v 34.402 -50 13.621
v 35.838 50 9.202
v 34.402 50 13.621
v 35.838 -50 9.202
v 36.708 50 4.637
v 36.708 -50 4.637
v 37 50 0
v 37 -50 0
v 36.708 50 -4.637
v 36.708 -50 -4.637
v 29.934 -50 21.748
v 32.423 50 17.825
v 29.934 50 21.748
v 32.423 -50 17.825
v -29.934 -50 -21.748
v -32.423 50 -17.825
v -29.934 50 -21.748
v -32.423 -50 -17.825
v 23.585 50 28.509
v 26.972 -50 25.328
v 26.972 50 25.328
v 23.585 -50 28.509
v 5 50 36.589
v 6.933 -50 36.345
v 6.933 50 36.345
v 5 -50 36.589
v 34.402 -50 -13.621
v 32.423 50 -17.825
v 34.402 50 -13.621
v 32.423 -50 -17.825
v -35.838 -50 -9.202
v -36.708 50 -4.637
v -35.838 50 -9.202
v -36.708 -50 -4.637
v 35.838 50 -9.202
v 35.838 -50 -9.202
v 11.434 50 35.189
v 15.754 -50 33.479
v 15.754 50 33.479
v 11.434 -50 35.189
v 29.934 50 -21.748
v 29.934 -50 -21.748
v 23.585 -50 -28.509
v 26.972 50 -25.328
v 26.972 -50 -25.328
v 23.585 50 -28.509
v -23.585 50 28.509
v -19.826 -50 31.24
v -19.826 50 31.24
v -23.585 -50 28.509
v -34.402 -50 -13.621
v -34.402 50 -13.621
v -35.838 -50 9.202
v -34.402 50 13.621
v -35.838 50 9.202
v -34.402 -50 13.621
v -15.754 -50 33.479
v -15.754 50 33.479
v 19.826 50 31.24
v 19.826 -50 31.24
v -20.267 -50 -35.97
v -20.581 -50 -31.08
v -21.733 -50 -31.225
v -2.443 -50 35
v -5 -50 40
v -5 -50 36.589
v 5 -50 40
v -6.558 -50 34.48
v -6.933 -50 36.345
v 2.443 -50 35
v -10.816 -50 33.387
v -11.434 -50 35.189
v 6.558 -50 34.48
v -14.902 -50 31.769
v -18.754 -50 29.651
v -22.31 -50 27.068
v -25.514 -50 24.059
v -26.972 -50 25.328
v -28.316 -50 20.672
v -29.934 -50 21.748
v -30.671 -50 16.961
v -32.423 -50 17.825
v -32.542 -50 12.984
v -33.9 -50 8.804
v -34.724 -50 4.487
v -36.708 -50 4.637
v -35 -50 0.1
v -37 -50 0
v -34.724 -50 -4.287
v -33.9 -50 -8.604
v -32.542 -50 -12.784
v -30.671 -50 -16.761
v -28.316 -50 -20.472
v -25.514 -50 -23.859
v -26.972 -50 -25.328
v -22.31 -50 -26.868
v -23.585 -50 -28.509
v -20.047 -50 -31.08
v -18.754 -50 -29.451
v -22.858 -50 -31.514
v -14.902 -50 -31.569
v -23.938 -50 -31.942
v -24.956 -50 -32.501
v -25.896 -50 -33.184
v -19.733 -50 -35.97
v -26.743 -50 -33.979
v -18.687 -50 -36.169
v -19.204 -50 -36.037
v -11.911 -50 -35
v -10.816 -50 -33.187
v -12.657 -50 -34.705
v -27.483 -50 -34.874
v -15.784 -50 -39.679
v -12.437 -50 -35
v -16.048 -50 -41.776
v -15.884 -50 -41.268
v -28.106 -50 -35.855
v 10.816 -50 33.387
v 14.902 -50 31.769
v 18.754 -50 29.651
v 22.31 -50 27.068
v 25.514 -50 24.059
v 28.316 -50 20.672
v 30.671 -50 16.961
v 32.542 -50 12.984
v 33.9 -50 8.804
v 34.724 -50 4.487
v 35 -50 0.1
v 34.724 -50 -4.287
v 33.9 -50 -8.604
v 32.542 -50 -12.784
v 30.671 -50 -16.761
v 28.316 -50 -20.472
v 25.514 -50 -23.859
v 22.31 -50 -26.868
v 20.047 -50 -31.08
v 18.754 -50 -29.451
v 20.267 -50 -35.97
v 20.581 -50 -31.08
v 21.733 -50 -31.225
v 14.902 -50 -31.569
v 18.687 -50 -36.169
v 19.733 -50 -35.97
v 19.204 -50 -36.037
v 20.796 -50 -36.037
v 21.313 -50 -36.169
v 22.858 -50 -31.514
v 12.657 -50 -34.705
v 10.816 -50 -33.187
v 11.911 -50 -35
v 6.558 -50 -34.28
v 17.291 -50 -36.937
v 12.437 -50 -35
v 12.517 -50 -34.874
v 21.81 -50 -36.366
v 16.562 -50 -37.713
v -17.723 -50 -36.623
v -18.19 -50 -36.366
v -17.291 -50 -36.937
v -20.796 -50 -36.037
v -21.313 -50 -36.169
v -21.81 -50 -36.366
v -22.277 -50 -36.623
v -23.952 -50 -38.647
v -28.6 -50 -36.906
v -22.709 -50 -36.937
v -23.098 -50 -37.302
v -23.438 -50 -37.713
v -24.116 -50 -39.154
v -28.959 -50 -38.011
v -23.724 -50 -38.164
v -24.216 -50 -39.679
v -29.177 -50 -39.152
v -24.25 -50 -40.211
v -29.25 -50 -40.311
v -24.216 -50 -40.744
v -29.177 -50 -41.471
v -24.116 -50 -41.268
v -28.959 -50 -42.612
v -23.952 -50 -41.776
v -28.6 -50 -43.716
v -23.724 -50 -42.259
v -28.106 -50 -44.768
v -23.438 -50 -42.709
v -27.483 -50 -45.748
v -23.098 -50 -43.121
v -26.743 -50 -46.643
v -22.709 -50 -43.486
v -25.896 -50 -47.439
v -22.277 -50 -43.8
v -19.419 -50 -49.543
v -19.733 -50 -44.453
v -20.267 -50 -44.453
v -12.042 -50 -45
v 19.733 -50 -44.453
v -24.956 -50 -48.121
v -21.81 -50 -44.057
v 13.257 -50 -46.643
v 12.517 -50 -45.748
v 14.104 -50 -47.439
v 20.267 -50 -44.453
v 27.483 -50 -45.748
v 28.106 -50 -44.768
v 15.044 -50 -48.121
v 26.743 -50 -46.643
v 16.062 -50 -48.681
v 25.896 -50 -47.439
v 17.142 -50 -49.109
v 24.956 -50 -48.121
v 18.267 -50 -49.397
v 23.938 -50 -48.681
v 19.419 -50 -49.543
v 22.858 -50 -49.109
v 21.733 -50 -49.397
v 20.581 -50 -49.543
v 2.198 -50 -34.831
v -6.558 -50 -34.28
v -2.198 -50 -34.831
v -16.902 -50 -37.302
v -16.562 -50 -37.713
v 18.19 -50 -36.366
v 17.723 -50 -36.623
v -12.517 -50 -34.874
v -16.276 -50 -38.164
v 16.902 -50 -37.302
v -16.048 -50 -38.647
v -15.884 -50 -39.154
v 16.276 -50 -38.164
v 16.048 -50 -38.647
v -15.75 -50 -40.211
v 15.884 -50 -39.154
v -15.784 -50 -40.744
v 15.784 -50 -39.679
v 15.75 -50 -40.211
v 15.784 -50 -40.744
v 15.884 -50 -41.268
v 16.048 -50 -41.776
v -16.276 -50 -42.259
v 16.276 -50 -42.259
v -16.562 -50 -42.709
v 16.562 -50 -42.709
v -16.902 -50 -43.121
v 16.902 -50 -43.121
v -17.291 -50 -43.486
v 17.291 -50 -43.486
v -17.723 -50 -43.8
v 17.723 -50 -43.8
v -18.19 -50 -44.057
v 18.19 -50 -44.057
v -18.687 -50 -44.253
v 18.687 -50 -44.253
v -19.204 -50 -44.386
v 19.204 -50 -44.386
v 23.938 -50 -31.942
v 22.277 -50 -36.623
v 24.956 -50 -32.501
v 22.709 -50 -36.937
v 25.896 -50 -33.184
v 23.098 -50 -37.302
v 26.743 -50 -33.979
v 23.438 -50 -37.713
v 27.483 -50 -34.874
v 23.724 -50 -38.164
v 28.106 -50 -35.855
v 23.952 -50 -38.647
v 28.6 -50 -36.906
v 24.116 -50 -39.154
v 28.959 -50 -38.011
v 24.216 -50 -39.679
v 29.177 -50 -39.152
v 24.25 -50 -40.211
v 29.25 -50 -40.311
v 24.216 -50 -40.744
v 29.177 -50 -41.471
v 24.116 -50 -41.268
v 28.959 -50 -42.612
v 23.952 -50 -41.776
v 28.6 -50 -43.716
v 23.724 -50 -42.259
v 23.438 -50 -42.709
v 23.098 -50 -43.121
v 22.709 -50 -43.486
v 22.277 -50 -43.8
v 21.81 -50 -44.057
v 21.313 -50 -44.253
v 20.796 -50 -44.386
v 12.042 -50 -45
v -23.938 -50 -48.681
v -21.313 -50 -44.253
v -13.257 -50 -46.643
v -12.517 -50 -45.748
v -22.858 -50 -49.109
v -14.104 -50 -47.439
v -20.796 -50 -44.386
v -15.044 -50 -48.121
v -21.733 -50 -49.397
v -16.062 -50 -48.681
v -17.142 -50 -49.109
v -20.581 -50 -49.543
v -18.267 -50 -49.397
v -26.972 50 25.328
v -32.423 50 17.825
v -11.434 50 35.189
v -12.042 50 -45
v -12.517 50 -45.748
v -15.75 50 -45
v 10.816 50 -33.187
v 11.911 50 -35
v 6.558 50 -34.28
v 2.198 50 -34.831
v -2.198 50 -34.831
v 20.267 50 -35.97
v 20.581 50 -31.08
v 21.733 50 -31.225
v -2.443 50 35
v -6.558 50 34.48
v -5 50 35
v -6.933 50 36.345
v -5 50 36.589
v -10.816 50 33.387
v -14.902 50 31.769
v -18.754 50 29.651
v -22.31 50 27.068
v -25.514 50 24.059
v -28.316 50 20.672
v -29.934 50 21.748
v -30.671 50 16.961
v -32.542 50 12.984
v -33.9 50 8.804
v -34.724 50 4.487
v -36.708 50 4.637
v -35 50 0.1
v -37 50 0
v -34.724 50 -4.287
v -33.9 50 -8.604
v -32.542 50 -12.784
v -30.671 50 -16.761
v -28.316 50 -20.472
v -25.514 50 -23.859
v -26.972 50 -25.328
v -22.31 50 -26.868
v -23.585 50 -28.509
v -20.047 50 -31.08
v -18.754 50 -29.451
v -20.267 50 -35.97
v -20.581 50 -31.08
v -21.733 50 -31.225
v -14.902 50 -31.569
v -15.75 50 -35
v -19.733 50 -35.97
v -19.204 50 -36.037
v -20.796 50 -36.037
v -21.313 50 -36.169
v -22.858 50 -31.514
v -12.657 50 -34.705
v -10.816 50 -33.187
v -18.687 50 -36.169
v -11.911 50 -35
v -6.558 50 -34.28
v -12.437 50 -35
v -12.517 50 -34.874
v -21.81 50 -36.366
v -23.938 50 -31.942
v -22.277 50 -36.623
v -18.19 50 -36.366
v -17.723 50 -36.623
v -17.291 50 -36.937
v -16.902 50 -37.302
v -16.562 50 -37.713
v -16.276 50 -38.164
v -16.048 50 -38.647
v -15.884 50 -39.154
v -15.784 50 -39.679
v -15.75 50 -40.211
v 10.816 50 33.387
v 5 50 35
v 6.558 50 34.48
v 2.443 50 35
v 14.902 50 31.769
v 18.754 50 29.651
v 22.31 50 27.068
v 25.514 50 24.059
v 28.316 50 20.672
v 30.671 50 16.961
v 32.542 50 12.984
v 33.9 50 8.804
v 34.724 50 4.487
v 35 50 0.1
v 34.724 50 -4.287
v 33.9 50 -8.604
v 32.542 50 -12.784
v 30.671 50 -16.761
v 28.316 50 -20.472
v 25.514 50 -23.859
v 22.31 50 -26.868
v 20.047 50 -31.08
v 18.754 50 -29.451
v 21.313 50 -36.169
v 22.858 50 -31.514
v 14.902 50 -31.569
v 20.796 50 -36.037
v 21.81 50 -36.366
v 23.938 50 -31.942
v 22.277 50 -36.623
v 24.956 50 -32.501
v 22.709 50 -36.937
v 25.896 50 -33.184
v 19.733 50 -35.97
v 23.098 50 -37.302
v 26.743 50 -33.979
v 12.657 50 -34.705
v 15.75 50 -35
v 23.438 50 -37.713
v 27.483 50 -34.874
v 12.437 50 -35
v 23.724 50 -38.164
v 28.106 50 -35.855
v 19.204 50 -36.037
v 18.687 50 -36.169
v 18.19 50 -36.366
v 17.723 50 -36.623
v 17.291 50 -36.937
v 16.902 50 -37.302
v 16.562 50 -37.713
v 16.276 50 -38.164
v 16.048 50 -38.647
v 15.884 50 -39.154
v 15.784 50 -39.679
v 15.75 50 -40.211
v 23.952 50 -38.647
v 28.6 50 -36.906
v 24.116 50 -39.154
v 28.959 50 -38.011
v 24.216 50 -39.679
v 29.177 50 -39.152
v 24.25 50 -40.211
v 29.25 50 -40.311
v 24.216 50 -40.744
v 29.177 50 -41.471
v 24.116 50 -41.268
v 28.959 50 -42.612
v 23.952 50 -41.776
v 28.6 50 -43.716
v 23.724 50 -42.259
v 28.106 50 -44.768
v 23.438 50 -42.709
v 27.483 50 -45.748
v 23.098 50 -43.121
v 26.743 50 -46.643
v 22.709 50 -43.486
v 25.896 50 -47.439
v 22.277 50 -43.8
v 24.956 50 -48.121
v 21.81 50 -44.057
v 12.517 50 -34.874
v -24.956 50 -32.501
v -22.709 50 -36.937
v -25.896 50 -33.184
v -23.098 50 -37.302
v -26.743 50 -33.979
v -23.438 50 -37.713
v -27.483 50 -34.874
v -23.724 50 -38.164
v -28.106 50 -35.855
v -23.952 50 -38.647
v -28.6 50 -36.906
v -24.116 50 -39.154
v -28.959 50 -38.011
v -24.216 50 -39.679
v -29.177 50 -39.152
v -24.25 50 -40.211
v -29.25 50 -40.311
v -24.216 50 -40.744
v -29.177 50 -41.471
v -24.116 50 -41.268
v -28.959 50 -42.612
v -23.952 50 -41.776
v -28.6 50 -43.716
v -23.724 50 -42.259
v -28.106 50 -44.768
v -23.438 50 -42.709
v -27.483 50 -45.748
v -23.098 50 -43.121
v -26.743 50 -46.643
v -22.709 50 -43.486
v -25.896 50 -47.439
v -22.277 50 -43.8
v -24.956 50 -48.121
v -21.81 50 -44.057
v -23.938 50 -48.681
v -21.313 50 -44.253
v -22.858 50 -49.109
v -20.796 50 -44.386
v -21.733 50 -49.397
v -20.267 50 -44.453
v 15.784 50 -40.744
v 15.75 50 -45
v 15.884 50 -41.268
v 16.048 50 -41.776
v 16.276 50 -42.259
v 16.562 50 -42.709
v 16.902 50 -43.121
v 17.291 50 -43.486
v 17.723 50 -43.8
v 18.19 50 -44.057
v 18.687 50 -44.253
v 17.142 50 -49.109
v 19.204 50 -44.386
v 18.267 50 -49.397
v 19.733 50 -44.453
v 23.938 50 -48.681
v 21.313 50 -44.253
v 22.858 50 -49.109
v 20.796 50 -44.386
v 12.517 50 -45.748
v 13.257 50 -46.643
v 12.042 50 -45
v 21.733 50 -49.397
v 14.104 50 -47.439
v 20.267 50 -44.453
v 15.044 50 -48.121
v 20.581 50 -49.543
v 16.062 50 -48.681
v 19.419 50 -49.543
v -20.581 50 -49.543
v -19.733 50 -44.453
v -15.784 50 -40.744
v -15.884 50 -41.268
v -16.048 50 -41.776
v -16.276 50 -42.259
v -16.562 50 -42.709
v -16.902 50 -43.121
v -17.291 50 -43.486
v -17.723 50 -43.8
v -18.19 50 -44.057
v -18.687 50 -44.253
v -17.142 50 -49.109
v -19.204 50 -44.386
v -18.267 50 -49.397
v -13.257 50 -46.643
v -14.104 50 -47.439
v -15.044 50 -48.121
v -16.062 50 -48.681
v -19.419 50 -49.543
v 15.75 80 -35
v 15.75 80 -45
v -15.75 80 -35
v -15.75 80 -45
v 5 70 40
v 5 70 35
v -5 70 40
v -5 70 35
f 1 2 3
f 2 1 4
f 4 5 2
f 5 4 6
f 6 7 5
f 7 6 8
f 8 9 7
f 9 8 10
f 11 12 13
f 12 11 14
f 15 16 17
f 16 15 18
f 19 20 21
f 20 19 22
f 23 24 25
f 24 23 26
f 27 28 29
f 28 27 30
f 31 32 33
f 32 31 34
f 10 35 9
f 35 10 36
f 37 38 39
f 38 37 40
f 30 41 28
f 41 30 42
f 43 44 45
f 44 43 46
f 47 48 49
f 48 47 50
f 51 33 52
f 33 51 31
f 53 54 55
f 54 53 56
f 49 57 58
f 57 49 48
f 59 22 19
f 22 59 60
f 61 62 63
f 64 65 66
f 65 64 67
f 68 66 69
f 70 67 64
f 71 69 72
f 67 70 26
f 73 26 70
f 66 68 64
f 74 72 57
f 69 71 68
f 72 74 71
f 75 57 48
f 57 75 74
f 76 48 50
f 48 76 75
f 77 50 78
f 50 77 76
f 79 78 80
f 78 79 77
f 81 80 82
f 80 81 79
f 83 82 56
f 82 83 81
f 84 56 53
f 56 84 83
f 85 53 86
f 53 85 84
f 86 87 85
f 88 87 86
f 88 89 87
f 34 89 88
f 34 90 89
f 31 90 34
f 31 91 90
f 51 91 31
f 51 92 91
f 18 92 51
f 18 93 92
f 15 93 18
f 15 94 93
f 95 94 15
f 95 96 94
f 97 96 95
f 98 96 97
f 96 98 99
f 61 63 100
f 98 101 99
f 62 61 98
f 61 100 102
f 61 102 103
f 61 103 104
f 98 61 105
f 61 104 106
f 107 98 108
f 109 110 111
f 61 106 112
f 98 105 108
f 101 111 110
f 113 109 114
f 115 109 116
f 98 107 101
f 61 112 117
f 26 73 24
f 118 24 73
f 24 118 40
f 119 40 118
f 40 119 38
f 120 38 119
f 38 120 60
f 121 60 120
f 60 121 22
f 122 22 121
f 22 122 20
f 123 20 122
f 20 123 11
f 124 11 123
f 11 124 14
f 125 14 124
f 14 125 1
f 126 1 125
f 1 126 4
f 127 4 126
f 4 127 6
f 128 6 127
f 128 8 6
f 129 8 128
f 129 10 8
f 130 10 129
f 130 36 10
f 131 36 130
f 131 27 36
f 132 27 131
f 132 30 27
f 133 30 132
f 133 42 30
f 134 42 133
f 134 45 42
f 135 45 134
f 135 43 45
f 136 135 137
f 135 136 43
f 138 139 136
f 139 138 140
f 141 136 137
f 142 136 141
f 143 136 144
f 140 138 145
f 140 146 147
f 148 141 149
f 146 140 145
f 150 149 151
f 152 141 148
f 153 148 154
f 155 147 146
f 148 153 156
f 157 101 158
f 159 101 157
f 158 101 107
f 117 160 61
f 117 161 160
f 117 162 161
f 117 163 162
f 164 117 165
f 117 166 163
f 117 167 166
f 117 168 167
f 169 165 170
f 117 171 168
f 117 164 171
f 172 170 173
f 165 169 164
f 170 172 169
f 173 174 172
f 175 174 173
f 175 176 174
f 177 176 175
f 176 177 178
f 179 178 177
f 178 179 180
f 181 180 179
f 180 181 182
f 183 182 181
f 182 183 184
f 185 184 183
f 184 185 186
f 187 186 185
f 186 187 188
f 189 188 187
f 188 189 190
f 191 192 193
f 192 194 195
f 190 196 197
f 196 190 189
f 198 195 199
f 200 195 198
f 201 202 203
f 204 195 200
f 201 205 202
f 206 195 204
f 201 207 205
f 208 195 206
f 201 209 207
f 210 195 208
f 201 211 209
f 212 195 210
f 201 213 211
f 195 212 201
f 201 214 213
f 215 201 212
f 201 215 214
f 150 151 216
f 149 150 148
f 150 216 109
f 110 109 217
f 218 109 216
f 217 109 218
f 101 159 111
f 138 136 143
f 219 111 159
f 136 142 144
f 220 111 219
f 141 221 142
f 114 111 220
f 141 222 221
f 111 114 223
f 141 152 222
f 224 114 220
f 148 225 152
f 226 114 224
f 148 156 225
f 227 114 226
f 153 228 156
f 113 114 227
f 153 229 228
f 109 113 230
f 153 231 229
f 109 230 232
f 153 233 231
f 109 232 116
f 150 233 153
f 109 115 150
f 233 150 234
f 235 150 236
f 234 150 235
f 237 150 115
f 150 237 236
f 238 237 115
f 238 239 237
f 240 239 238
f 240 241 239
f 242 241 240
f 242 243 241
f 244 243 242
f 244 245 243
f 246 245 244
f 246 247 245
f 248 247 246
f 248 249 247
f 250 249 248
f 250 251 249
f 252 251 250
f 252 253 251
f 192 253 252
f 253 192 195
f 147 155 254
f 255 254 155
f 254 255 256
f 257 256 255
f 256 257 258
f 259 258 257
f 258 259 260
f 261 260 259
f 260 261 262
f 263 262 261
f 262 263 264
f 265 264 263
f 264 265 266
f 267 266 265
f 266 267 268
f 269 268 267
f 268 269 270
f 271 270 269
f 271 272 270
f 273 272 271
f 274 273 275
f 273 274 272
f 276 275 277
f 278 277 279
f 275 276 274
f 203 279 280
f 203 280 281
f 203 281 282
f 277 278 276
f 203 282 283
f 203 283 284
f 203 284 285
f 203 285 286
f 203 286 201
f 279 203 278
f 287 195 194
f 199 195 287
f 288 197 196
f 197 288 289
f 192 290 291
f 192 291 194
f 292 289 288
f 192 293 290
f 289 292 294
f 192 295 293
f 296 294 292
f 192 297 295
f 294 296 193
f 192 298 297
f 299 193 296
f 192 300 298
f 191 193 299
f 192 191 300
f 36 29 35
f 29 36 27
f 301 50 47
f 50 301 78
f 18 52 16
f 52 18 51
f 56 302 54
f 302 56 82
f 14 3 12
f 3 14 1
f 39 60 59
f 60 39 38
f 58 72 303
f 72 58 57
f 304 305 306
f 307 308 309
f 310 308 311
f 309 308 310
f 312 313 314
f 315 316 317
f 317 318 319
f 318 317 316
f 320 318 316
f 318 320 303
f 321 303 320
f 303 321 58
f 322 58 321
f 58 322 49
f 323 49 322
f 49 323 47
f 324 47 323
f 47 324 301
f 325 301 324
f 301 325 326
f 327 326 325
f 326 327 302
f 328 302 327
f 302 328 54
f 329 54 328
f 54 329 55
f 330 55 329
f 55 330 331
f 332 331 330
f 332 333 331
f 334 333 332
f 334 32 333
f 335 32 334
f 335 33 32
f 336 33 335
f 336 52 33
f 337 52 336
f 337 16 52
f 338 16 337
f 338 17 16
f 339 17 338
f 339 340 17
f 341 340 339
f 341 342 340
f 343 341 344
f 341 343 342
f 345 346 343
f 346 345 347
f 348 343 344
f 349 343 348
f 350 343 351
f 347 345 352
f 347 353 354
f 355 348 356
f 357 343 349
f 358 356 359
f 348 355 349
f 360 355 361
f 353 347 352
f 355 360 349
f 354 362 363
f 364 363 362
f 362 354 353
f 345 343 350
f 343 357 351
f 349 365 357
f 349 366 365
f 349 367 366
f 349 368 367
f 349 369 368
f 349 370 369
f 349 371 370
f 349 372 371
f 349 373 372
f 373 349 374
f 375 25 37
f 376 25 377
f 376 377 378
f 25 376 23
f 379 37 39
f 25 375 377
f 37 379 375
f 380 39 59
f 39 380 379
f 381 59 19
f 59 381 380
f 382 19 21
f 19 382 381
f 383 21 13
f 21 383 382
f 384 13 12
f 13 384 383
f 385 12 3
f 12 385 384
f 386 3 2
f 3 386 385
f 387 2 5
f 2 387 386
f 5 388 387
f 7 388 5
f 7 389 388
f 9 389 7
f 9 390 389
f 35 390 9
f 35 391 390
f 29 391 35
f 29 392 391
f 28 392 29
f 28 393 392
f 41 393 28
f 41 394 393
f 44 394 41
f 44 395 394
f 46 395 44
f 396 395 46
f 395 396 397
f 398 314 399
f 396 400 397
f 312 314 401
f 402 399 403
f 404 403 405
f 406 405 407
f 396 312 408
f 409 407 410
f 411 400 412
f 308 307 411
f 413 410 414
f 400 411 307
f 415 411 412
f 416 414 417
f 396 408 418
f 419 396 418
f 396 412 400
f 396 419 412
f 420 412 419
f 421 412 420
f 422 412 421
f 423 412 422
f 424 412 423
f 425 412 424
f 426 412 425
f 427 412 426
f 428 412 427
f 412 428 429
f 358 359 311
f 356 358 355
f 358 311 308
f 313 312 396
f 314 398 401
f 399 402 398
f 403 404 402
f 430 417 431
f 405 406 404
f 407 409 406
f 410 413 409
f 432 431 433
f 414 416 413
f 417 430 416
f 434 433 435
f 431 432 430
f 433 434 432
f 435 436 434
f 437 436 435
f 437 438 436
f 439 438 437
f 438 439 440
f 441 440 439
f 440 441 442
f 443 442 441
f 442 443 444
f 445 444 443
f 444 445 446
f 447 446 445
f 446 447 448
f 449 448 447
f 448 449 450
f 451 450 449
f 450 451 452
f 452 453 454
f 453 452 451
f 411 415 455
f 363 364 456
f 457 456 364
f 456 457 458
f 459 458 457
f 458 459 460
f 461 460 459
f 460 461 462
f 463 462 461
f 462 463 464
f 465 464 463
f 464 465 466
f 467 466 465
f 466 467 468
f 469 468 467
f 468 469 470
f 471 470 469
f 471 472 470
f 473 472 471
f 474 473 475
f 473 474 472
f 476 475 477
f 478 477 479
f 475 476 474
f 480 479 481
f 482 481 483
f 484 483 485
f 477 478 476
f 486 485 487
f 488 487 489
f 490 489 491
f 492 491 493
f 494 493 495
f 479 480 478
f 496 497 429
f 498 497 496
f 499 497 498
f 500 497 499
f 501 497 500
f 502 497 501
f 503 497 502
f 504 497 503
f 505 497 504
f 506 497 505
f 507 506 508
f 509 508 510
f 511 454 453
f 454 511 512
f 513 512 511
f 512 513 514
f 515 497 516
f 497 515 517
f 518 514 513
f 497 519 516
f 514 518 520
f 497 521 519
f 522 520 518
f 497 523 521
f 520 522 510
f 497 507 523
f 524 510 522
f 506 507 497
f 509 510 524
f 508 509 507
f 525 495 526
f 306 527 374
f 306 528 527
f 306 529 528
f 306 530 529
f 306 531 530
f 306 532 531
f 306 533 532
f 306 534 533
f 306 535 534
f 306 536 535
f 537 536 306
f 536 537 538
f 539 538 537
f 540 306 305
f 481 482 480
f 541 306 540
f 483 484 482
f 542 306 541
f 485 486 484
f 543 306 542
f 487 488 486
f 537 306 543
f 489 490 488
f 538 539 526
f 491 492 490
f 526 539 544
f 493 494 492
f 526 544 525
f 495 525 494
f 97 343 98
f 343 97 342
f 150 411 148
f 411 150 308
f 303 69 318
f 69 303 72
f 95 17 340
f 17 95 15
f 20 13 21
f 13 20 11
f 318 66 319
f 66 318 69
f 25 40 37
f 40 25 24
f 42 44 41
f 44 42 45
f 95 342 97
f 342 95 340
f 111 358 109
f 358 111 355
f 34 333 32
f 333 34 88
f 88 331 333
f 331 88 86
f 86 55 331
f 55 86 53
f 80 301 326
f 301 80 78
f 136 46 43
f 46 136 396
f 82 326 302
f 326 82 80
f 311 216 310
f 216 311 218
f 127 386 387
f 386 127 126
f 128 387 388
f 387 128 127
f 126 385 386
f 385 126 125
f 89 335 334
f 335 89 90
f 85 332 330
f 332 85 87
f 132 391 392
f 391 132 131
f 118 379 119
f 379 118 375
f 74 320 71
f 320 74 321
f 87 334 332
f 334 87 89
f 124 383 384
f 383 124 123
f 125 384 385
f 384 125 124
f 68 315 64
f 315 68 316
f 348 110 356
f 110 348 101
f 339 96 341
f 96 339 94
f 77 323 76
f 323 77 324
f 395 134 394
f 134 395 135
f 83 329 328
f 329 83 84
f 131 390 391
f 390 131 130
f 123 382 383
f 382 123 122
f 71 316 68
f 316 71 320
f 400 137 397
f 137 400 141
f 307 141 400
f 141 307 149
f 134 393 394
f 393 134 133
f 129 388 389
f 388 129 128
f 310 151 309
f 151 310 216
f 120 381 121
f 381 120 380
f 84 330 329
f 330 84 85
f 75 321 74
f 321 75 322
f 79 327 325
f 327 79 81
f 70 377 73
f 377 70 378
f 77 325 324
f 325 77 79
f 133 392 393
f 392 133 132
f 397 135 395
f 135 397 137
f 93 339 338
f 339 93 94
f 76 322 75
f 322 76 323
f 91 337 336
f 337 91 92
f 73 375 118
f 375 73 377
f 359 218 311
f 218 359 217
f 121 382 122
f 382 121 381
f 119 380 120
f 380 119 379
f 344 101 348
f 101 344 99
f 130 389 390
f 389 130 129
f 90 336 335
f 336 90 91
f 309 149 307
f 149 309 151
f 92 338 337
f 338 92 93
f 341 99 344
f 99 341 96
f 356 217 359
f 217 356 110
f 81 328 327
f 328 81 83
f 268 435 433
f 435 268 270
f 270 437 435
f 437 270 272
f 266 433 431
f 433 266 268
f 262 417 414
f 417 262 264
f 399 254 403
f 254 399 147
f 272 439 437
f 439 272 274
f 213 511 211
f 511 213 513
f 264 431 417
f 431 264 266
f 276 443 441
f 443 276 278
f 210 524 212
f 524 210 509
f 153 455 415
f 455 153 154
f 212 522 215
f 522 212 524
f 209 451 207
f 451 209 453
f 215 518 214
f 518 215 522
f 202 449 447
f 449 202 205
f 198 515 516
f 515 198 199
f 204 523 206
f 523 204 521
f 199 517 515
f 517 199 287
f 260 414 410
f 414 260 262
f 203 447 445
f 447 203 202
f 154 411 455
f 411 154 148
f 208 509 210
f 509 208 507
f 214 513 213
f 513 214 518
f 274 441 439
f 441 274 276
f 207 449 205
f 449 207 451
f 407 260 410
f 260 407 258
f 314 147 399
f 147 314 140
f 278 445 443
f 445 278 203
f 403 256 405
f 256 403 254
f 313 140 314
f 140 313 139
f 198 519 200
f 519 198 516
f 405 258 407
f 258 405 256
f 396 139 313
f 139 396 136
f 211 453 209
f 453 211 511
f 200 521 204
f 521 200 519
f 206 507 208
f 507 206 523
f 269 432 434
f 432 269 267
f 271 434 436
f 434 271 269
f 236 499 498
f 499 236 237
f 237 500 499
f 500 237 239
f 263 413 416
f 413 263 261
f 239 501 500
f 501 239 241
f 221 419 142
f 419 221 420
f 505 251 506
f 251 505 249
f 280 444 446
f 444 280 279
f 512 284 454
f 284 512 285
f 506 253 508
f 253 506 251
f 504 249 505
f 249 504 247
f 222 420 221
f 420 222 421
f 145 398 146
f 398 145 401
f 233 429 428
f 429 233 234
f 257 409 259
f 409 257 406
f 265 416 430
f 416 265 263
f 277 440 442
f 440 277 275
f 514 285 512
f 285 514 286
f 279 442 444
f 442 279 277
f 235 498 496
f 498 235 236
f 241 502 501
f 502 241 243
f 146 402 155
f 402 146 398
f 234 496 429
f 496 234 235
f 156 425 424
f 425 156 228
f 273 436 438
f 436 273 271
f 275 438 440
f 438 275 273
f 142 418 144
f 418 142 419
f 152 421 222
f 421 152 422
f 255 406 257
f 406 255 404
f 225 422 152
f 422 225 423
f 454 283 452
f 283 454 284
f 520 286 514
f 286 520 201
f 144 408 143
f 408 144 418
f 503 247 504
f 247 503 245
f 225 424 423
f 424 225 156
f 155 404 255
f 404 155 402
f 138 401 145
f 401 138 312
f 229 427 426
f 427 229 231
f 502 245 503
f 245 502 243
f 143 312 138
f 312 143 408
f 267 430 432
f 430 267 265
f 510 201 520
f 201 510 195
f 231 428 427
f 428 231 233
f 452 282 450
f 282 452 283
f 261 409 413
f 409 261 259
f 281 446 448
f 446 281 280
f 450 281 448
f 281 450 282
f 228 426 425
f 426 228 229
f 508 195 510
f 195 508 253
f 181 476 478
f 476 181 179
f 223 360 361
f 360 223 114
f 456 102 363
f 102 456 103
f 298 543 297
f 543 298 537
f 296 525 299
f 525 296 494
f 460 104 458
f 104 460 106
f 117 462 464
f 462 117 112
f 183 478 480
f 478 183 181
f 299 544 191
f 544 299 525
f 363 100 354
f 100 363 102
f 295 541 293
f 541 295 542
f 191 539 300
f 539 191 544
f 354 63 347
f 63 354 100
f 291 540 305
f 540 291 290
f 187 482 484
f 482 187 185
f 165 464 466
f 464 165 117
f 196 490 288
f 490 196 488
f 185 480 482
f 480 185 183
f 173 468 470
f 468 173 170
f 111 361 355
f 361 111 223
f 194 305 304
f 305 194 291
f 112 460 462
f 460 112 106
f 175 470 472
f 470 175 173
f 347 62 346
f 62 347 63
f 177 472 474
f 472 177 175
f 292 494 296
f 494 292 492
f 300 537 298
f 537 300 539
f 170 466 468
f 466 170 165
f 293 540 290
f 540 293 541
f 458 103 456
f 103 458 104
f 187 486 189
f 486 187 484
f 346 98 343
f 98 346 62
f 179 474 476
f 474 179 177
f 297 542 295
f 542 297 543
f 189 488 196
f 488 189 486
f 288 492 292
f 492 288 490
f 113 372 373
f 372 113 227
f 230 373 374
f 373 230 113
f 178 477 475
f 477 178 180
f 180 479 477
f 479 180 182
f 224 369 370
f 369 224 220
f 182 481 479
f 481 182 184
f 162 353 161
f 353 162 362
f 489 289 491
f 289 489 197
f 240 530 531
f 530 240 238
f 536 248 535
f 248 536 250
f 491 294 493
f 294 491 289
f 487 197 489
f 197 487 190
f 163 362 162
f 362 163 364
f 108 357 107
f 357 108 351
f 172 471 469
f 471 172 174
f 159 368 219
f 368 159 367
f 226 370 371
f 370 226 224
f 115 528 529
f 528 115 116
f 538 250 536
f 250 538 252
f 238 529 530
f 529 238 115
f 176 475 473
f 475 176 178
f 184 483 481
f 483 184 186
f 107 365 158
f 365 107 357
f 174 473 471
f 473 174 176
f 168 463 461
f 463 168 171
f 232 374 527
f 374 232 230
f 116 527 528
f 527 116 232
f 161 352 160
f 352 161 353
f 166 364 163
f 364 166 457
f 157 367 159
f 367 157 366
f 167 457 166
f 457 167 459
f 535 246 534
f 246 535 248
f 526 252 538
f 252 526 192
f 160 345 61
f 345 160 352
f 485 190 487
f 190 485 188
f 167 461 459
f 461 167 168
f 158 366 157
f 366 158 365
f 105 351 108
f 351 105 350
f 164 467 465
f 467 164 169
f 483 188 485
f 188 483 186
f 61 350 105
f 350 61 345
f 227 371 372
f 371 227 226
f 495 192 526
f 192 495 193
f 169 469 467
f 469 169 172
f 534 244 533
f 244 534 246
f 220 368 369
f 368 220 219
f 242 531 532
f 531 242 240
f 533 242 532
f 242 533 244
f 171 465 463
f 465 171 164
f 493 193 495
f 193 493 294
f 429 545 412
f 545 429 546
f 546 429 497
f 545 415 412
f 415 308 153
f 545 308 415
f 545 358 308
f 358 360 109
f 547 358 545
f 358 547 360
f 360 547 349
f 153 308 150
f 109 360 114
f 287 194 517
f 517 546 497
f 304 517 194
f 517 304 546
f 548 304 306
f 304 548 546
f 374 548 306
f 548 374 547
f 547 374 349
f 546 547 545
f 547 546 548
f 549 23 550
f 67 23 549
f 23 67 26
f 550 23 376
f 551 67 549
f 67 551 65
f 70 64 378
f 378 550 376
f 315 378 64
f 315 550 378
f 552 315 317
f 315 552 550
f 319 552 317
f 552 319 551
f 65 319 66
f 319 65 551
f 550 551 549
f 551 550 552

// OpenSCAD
// file: variables.scad
// ##########################################//
// General
// ##########################################//
$fn = 50;
DIFFERENCE_FIX = 0.1;
DIFFERENCE_FIX_NEGATIVE = -1 * DIFFERENCE_FIX;
DIFFERENCE_FIX_2 = 2 * DIFFERENCE_FIX;

// ##########################################//
// Nose
// ##########################################//
noseTopThickness = 1;
noseTopOffsetZ = 60;
noseHeight = noseTopOffsetZ + noseTopThickness;
noseLength = 100;
noseTopEndOffset = 20;
noseTopSharpnessFactor = 4;
noseBotttomSharpnessFactor = 3;
noseTopThicknessFactor = 1;
noseBottomThicknessFactor = 3;

// ##########################################//
// Hull
// ##########################################//
hullThickness = 3;
hullWidth = 70 - hullThickness * 2;
hullLength = 500 - hullThickness * 2;
hullHeight = noseHeight + hullThickness;
hullSpacing = 100;
hullCutoutWidth = 46;
hullCutoutHeight = 150;

// ##########################################//
// Hull Mounts
// ##########################################//
hullMountHoleRadius = 4.25;
hullMountHeight = 20;
hullMountWidth = 20;
hullMountDepth = 50;
hullMountOffsetY = 100;

// ##########################################//
// Rod Connectors
// ##########################################//
rodConnectorWidth = 20;
rodConnectorRadius = 10;
rodConnectorTopOffset = 3;

// ##########################################//
// Lid
// ##########################################//
lidLip = 5;
lidThickness = 3;
lidGap = 0.4;
lidText = "+1 555 123 1234";
lidTextOffsetX = 28;
lidTextOffsetY = 20;

// ##########################################//
// Motor mount
// ##########################################//
motorMountMotorRadius = 35;
motorMountMotorDepth = 100;
motorMountThickness = 4;
motorMountMountThickness = 5;
motorMountMountOffsetX = 20;
motorMountSupportHeight = 10;
motorMountSupportExtensionY = 30;
motorMountOffsetY = 300;
motorMountRudderSupportHeight = 5;
motorMountRudderSupportWidth = 10;
motorMountRudderSupportExtensionY = 20;


// ##########################################//
// Rudder
// ##########################################//
rudderHeight = motorMountMotorRadius * 2 - 10;
rudderWidth = 60;
rudderThickness = 3;
rudderMountTopHeight = motorMountRudderSupportHeight + 1;
// main file
include <variables.scad>

// Cylinder to fit motor in
module motorCylinder() {
    rotate([90, 0, 0])

    difference() {
        // Outer motor mount
        cylinder(h = motorMountMotorDepth, r = motorMountMotorRadius + motorMountThickness / 2, center = true);

        // Motor mount thickness
        translate([0, DIFFERENCE_FIX, 0])
        cylinder(h = motorMountMotorDepth + DIFFERENCE_FIX_2, r = motorMountMotorRadius, center = true);
    }
}

// Motor mount supports that mount to rods
module motorMountMount() {
    rotate([90, 0, 0])

    difference() {
        // Outer motor mount
        cylinder(h = motorMountMotorDepth, r = hullMountHoleRadius + motorMountMountThickness, center = true);

        // Cutout
        translate([0, DIFFERENCE_FIX, 0])
        cylinder(h = motorMountMotorDepth + DIFFERENCE_FIX_2, r = hullMountHoleRadius, center = true);
    }
}

// Additional support between motor mounts and motor cylinder
module motorMountSupport() {
    cube([
        2 * (motorMountMountOffsetX - hullMountHoleRadius),
        motorMountMotorDepth + motorMountSupportExtensionY,
        motorMountSupportHeight
    ],center = true);
}

// Additional support that holds the top of the rudder
module motorMountRudderSupport() {
    cube([
        motorMountRudderSupportWidth,
        motorMountMotorDepth + motorMountRudderSupportExtensionY,
        motorMountRudderSupportHeight
    ],center = true);
}

// Calculate the Z offset for the supports that mount to the rods (dependent from
// distance from x)
function motorMountMountOffsetZ(x) = sqrt(pow(motorMountMotorRadius, 2) + pow(x, 2));

// Motor mount
module motorMount() {
    // Cylinder for motor
    motorCylinder();

    // Right motor mount
    translate([motorMountMountOffsetX, 0, -motorMountMountOffsetZ(motorMountMountOffsetX)])
    motorMountMount();

    // Left motor mount
    translate([-motorMountMountOffsetX, 0, -motorMountMountOffsetZ(motorMountMountOffsetX)])
    motorMountMount();

    // Additonal support
    translate([
        0,
        motorMountSupportExtensionY / 2,
        -motorMountMountOffsetZ(0) - motorMountSupportHeight / 2
    ])
    motorMountSupport();

    // Top support for rudder
    translate([
        0,
        motorMountRudderSupportExtensionY / 2,
        motorMountMountOffsetZ(0) + motorMountRudderSupportHeight / 2
    ])
    motorMountRudderSupport();
}

motorMount();
